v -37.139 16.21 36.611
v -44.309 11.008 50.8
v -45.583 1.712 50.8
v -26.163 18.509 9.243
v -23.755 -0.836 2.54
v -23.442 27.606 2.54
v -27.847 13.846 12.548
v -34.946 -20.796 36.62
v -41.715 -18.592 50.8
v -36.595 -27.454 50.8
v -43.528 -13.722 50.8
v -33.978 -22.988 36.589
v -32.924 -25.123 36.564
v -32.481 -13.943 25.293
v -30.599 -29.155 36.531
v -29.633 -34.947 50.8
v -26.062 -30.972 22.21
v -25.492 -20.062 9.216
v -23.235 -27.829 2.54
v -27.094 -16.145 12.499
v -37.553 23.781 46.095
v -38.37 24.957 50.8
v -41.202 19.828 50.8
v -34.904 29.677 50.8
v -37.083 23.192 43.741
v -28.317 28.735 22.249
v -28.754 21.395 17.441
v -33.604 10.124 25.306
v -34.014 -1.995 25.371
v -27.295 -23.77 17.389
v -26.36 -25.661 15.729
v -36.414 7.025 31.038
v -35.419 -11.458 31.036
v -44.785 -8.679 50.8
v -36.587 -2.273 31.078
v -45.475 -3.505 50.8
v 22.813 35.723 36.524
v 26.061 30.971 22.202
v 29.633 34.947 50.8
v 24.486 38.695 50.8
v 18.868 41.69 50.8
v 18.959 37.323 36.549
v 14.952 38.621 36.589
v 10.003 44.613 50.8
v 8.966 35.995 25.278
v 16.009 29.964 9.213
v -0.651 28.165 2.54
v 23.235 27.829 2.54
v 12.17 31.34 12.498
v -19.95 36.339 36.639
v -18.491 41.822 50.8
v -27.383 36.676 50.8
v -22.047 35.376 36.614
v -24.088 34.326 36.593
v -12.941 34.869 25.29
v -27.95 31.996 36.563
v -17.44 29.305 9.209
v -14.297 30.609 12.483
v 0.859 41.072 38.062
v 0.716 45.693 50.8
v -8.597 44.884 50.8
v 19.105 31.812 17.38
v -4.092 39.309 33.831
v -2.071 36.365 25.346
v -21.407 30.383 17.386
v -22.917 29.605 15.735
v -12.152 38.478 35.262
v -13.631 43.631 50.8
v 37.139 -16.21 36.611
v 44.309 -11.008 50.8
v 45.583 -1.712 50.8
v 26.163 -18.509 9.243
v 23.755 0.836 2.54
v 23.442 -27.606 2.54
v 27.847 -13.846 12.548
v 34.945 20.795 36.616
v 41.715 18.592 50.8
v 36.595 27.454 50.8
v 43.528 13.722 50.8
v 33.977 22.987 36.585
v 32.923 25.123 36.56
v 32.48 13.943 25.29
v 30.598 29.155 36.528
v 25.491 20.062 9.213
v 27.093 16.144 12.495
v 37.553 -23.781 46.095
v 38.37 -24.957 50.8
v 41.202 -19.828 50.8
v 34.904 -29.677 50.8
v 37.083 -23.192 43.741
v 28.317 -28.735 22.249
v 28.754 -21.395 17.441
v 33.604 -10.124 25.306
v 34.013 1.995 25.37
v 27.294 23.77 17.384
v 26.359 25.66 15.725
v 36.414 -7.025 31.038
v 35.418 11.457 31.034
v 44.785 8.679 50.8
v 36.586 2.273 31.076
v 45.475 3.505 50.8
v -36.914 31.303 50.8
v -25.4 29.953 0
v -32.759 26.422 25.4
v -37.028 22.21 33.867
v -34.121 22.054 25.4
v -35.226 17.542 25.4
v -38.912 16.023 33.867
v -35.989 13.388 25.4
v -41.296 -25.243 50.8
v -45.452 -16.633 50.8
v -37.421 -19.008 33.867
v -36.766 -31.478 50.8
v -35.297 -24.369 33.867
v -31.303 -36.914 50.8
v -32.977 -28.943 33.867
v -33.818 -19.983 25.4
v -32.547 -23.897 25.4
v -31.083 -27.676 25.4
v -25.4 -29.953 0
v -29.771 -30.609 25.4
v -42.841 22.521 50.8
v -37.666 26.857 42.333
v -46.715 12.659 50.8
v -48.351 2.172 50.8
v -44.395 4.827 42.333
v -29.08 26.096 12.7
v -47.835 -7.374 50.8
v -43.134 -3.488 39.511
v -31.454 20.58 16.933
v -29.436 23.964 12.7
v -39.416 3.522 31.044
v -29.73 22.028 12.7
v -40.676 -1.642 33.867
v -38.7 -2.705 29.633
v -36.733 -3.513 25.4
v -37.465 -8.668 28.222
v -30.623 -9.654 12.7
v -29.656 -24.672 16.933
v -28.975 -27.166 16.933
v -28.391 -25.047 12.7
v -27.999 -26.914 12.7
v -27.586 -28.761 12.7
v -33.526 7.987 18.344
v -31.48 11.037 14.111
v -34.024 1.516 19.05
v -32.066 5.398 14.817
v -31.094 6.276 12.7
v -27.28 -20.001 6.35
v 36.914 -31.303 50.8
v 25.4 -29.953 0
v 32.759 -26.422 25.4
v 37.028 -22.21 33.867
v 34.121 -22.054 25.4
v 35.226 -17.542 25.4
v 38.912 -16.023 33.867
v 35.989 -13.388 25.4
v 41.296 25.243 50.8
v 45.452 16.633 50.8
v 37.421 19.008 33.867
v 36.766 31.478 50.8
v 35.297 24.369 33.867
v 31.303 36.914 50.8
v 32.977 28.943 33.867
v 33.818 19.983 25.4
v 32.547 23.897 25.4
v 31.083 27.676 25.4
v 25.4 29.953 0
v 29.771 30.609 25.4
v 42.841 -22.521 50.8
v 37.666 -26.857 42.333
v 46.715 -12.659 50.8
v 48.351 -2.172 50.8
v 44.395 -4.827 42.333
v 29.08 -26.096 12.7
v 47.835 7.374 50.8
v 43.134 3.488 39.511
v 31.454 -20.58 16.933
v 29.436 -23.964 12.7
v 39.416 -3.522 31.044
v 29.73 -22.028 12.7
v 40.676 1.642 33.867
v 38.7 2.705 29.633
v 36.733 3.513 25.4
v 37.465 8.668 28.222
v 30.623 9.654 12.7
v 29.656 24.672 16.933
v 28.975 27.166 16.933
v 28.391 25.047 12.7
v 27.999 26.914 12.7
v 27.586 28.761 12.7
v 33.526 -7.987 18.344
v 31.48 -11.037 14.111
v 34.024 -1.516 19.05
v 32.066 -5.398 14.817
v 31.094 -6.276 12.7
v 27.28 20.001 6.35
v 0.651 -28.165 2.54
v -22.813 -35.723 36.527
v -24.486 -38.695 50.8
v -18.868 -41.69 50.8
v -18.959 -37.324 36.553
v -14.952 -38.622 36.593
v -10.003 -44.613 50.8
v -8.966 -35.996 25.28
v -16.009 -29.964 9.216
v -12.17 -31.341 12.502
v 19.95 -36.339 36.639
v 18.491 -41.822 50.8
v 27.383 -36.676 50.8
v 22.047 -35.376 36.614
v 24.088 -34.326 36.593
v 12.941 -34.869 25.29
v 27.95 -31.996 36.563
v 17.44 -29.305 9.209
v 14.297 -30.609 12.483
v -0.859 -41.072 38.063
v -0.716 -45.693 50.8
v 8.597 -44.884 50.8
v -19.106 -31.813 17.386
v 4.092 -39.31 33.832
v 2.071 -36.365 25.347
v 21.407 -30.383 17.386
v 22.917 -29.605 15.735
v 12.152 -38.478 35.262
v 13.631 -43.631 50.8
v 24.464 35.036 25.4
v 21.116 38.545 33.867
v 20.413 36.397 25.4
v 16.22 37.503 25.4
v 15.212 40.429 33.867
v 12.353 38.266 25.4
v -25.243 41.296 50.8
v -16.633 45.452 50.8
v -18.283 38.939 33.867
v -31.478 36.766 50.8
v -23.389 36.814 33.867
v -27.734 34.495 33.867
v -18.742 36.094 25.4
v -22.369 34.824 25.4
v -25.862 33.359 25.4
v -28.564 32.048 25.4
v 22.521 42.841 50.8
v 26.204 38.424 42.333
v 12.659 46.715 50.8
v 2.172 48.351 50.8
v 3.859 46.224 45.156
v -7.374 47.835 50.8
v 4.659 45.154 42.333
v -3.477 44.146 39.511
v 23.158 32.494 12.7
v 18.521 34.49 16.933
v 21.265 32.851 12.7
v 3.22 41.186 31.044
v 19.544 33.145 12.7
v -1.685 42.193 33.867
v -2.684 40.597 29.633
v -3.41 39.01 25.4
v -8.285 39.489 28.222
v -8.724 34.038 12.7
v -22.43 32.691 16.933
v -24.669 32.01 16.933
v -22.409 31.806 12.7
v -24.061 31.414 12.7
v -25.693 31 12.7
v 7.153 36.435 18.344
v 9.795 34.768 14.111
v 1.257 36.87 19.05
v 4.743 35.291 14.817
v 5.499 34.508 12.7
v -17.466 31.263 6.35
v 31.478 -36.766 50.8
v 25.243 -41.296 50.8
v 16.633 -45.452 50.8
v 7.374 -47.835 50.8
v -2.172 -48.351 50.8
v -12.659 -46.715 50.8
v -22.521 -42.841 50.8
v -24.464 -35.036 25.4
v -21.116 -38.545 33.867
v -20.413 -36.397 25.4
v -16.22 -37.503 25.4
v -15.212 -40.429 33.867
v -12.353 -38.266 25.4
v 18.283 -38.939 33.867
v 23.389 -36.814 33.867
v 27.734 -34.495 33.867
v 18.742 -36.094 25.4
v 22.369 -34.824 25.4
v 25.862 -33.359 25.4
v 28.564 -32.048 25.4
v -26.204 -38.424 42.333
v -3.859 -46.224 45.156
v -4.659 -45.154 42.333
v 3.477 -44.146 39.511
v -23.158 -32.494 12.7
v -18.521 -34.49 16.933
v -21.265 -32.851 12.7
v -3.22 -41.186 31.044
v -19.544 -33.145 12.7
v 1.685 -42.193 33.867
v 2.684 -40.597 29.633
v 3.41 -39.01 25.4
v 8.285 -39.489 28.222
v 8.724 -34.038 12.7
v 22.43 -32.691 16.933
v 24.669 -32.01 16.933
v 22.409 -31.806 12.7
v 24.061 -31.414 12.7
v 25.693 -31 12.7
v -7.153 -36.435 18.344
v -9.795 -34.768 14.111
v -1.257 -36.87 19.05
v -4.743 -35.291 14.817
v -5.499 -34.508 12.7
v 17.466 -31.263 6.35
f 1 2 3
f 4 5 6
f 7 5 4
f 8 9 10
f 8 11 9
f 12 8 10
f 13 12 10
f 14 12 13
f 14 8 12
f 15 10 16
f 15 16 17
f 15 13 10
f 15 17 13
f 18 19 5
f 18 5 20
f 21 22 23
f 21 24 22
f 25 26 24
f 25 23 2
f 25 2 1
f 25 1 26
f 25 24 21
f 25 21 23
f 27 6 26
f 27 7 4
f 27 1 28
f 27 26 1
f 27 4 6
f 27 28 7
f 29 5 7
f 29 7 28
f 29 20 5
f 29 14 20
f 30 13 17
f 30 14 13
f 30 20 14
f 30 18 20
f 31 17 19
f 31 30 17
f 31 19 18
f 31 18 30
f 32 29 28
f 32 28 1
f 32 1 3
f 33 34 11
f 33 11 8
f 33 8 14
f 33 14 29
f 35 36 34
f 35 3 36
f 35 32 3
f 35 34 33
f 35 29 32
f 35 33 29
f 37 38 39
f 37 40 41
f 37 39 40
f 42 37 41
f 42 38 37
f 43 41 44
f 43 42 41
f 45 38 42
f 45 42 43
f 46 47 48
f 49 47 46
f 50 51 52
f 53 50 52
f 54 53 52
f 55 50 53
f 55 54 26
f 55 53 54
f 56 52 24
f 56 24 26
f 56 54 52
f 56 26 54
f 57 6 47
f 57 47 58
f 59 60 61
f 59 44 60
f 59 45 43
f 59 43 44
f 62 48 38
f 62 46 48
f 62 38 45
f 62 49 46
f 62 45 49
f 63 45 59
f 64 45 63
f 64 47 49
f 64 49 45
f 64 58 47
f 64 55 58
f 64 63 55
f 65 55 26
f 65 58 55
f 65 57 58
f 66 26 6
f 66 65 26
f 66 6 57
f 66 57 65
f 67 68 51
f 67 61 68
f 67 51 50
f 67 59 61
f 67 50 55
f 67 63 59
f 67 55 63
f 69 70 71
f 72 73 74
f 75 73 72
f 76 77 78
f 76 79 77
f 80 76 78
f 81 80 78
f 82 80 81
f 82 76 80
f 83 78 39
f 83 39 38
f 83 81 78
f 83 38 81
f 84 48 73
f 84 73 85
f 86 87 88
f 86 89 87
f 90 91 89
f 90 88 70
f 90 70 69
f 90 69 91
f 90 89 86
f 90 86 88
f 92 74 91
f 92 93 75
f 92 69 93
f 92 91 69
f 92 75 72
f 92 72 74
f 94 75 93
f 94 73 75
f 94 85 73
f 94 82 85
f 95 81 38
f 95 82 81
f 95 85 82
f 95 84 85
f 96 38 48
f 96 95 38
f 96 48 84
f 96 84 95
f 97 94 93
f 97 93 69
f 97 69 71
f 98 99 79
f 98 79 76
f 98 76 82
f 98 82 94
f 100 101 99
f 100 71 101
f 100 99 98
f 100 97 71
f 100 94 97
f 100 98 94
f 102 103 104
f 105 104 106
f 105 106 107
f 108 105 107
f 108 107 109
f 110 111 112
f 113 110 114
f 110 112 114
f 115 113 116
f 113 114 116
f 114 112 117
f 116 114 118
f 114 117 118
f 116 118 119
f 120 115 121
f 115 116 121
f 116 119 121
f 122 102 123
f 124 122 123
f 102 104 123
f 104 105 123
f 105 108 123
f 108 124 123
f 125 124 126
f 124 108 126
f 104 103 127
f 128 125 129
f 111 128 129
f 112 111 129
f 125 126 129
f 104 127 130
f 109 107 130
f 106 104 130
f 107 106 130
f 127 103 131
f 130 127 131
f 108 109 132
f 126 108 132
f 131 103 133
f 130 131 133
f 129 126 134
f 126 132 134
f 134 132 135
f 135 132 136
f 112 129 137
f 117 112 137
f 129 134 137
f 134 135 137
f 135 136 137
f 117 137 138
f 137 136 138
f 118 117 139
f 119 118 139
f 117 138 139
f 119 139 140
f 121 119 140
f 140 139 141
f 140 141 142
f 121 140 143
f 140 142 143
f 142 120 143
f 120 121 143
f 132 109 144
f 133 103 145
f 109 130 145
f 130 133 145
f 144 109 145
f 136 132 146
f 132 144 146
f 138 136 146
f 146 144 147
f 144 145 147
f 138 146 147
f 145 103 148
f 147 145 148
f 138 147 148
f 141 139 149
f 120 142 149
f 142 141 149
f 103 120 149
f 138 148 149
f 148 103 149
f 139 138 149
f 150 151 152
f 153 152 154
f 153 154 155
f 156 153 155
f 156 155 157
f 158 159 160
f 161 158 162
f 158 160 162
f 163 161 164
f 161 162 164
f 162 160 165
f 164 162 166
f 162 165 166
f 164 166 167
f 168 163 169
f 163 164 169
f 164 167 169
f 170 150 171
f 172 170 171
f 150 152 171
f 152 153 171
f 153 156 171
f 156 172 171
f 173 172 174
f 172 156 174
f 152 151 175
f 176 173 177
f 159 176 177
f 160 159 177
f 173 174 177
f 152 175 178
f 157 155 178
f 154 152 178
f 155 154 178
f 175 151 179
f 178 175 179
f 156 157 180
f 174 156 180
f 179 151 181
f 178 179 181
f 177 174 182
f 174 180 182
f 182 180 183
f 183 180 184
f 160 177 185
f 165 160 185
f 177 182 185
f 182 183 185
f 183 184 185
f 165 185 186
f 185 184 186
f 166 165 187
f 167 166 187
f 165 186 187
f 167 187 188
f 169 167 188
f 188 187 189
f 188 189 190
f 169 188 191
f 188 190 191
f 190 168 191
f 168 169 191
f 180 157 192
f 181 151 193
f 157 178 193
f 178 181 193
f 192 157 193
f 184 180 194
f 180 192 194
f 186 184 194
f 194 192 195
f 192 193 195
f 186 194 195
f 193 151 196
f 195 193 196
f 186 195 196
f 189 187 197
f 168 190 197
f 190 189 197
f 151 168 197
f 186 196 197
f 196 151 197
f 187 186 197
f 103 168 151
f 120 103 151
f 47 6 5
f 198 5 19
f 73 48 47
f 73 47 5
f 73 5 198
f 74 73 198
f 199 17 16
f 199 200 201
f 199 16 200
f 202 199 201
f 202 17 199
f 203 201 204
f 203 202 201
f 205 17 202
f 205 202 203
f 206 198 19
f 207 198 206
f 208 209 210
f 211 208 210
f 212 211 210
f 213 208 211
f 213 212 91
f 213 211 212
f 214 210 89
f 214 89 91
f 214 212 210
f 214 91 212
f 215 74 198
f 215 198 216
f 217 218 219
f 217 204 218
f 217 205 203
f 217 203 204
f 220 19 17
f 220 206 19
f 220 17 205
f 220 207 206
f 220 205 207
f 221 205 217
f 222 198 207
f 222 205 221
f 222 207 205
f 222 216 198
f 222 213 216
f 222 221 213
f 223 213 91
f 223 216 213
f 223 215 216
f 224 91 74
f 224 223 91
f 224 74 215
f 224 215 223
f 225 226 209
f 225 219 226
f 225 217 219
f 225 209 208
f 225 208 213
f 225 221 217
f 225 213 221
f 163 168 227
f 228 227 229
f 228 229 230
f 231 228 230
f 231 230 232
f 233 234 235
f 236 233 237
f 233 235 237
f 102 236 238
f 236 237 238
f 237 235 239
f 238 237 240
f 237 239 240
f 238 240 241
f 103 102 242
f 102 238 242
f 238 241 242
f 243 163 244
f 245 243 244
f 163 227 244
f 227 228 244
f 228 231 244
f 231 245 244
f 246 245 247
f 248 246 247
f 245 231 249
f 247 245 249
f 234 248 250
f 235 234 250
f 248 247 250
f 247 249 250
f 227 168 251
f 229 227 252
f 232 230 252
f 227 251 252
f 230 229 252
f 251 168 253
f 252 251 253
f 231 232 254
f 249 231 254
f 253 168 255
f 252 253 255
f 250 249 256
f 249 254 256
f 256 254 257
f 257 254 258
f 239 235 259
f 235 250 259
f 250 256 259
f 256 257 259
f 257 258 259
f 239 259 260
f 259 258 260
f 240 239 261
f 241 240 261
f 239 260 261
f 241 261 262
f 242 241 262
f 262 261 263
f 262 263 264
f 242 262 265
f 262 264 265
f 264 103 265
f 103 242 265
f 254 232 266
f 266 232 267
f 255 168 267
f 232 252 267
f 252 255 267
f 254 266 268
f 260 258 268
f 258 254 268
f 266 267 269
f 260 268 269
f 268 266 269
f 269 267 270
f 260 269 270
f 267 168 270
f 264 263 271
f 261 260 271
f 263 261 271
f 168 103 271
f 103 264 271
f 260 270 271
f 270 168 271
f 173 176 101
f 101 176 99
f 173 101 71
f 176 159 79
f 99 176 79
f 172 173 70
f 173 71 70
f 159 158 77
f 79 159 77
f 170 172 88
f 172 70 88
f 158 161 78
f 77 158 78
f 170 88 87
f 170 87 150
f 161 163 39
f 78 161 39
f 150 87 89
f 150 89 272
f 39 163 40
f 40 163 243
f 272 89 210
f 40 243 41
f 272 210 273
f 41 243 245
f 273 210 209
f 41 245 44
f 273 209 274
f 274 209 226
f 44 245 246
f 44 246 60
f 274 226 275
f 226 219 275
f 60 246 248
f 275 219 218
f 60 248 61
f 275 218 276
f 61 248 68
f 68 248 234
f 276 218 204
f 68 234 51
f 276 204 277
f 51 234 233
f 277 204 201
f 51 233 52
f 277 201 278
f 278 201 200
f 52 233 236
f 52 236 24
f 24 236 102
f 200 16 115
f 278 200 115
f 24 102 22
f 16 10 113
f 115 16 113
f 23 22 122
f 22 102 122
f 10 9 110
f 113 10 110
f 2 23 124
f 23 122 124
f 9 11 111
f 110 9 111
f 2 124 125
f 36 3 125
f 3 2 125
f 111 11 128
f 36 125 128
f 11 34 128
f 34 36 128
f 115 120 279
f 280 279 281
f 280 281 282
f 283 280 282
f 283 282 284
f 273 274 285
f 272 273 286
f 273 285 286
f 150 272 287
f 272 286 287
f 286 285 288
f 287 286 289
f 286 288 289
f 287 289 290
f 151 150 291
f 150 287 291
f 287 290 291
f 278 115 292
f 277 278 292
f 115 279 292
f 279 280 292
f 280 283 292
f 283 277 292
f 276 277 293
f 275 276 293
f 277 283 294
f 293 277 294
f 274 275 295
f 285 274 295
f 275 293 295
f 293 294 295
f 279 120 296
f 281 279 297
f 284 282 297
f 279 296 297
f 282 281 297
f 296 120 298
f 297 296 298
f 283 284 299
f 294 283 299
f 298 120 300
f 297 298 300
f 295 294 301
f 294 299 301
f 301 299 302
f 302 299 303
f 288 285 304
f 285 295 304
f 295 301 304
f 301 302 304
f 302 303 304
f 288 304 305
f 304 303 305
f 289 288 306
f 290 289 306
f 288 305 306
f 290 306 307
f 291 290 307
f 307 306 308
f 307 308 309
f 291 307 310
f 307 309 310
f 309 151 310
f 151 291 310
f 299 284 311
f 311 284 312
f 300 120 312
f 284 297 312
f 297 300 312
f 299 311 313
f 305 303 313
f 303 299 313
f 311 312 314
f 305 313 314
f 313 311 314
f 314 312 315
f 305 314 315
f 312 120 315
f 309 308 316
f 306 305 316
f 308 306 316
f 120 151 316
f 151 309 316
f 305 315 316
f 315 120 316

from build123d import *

# Parameters (mm, degrees)
F0_W = 50.8
F0_H = 59.9056573934
F4_T = 2.54


# Not quite as in the source:
# - the arcs of a loft's sections are written as splines that run evenly, so that the points pair up as in the source's solid
# - a shell that OpenCascade refuses in one call is made with other operations: the cavity is built on its own and cut out


with BuildPart() as f3:
    # F2 (on offset) → F3 section 0
    with BuildSketch(Plane.XY.offset(50.8)):
        with BuildLine():
            add(Edge.make_bspline(
                [(31.3033898449, 36.9143729784), (28.8873497832, 38.9631750527), (26.269585061, 40.7739731742), (20.7309490894, 43.8501509409), (17.8102147937, 45.1154545216), (11.7778696482, 47.0519901199), (8.66640796, 47.7231742528), (2.3721732815, 48.4456477056), (-0.8104440715, 48.4969191609), (-7.1246843741, 47.9775662186), (-10.2561511918, 47.406954663), (-16.3477444048, 45.6657337679), (-19.3077201735, 44.4951674836), (-24.9425697859, 41.5989927782), (-27.6173042968, 39.8734559709), (-32.5788661981, 35.9336258251), (-34.865570904, 33.7194299066), (-36.9143729784, 31.3033898449)],
                knots=[0, 0, 0, 0, 0.125, 0.125, 0.25, 0.25, 0.375, 0.375, 0.5, 0.5, 0.625, 0.625, 0.75, 0.75, 0.875, 0.875, 1, 1, 1, 1], degree=3))
            add(Edge.make_bspline(
                [(-36.9143729784, 31.3033898449), (-38.9631750527, 28.8873497832), (-40.7739731742, 26.269585061), (-43.8501509409, 20.7309490894), (-45.1154545216, 17.8102147937), (-47.0519901199, 11.7778696482), (-47.7231742528, 8.66640796), (-48.4456477056, 2.3721732815), (-48.4969191609, -0.8104440715), (-47.9775662186, -7.1246843741), (-47.406954663, -10.2561511918), (-45.6657337679, -16.3477444048), (-44.4951674836, -19.3077201735), (-41.5989927782, -24.9425697859), (-39.8734559709, -27.6173042968), (-35.9336258251, -32.5788661981), (-33.7194299066, -34.865570904), (-31.3033898449, -36.9143729784)],
                knots=[0, 0, 0, 0, 0.125, 0.125, 0.25, 0.25, 0.375, 0.375, 0.5, 0.5, 0.625, 0.625, 0.75, 0.75, 0.875, 0.875, 1, 1, 1, 1], degree=3))
            add(Edge.make_bspline(
                [(-31.3033898449, -36.9143729784), (-28.8873497832, -38.9631750527), (-26.269585061, -40.7739731742), (-20.7309490894, -43.8501509409), (-17.8102147937, -45.1154545216), (-11.7778696482, -47.0519901199), (-8.66640796, -47.7231742528), (-2.3721732815, -48.4456477056), (0.8104440715, -48.4969191609), (7.1246843741, -47.9775662186), (10.2561511918, -47.406954663), (16.3477444048, -45.6657337679), (19.3077201735, -44.4951674836), (24.9425697859, -41.5989927782), (27.6173042968, -39.8734559709), (32.5788661981, -35.9336258251), (34.865570904, -33.7194299066), (36.9143729784, -31.3033898449)],
                knots=[0, 0, 0, 0, 0.125, 0.125, 0.25, 0.25, 0.375, 0.375, 0.5, 0.5, 0.625, 0.625, 0.75, 0.75, 0.875, 0.875, 1, 1, 1, 1], degree=3))
            add(Edge.make_bspline(
                [(36.9143729784, -31.3033898449), (38.9631750527, -28.8873497832), (40.7739731742, -26.269585061), (43.8501509409, -20.7309490894), (45.1154545216, -17.8102147937), (47.0519901199, -11.7778696482), (47.7231742528, -8.66640796), (48.4456477056, -2.3721732815), (48.4969191609, 0.8104440715), (47.9775662186, 7.1246843741), (47.406954663, 10.2561511918), (45.6657337679, 16.3477444048), (44.4951674836, 19.3077201735), (41.5989927782, 24.9425697859), (39.8734559709, 27.6173042968), (35.9336258251, 32.5788661981), (33.7194299066, 34.865570904), (31.3033898449, 36.9143729784)],
                knots=[0, 0, 0, 0, 0.125, 0.125, 0.25, 0.25, 0.375, 0.375, 0.5, 0.5, 0.625, 0.625, 0.75, 0.75, 0.875, 0.875, 1, 1, 1, 1], degree=3))
        make_face()
    # F0 (on Top) → F3 section 1
    with BuildSketch(Plane.XY):
        Rectangle(F0_W, F0_H)
    loft(ruled=True)

    # F4: shell of thickness 2.54, made by hand


with BuildPart() as f4_core1:
    # F4_t2: copy of F3
    add(f3.part)

    # the walls: a layer under each face that stays
    f4_faces = [f4_core1.faces().sort_by_distance(p)[0] for p in [
        (-1.9837821114, 39.0950356932, 25.4),
        (-36.8186213449, -1.9837821114, 25.4),
        (1.9837821114, -39.0950356932, 25.4),
        (36.8186213449, 1.9837821114, 25.4),
        (0, 0, 0),
    ]]
    thicken(f4_faces, amount=-F4_T, mode=Mode.SUBTRACT)


with BuildPart() as f3_1:
    add(f3.part)

    # what is left inside the walls is the cavity
    f4_cavity = [f4_core1.part.solids().sort_by_distance(p)[0] for p in [
        (11.647477, -9.877061, 50.7746),
    ]]
    add(f4_cavity, mode=Mode.SUBTRACT)


solid = f3_1.part
